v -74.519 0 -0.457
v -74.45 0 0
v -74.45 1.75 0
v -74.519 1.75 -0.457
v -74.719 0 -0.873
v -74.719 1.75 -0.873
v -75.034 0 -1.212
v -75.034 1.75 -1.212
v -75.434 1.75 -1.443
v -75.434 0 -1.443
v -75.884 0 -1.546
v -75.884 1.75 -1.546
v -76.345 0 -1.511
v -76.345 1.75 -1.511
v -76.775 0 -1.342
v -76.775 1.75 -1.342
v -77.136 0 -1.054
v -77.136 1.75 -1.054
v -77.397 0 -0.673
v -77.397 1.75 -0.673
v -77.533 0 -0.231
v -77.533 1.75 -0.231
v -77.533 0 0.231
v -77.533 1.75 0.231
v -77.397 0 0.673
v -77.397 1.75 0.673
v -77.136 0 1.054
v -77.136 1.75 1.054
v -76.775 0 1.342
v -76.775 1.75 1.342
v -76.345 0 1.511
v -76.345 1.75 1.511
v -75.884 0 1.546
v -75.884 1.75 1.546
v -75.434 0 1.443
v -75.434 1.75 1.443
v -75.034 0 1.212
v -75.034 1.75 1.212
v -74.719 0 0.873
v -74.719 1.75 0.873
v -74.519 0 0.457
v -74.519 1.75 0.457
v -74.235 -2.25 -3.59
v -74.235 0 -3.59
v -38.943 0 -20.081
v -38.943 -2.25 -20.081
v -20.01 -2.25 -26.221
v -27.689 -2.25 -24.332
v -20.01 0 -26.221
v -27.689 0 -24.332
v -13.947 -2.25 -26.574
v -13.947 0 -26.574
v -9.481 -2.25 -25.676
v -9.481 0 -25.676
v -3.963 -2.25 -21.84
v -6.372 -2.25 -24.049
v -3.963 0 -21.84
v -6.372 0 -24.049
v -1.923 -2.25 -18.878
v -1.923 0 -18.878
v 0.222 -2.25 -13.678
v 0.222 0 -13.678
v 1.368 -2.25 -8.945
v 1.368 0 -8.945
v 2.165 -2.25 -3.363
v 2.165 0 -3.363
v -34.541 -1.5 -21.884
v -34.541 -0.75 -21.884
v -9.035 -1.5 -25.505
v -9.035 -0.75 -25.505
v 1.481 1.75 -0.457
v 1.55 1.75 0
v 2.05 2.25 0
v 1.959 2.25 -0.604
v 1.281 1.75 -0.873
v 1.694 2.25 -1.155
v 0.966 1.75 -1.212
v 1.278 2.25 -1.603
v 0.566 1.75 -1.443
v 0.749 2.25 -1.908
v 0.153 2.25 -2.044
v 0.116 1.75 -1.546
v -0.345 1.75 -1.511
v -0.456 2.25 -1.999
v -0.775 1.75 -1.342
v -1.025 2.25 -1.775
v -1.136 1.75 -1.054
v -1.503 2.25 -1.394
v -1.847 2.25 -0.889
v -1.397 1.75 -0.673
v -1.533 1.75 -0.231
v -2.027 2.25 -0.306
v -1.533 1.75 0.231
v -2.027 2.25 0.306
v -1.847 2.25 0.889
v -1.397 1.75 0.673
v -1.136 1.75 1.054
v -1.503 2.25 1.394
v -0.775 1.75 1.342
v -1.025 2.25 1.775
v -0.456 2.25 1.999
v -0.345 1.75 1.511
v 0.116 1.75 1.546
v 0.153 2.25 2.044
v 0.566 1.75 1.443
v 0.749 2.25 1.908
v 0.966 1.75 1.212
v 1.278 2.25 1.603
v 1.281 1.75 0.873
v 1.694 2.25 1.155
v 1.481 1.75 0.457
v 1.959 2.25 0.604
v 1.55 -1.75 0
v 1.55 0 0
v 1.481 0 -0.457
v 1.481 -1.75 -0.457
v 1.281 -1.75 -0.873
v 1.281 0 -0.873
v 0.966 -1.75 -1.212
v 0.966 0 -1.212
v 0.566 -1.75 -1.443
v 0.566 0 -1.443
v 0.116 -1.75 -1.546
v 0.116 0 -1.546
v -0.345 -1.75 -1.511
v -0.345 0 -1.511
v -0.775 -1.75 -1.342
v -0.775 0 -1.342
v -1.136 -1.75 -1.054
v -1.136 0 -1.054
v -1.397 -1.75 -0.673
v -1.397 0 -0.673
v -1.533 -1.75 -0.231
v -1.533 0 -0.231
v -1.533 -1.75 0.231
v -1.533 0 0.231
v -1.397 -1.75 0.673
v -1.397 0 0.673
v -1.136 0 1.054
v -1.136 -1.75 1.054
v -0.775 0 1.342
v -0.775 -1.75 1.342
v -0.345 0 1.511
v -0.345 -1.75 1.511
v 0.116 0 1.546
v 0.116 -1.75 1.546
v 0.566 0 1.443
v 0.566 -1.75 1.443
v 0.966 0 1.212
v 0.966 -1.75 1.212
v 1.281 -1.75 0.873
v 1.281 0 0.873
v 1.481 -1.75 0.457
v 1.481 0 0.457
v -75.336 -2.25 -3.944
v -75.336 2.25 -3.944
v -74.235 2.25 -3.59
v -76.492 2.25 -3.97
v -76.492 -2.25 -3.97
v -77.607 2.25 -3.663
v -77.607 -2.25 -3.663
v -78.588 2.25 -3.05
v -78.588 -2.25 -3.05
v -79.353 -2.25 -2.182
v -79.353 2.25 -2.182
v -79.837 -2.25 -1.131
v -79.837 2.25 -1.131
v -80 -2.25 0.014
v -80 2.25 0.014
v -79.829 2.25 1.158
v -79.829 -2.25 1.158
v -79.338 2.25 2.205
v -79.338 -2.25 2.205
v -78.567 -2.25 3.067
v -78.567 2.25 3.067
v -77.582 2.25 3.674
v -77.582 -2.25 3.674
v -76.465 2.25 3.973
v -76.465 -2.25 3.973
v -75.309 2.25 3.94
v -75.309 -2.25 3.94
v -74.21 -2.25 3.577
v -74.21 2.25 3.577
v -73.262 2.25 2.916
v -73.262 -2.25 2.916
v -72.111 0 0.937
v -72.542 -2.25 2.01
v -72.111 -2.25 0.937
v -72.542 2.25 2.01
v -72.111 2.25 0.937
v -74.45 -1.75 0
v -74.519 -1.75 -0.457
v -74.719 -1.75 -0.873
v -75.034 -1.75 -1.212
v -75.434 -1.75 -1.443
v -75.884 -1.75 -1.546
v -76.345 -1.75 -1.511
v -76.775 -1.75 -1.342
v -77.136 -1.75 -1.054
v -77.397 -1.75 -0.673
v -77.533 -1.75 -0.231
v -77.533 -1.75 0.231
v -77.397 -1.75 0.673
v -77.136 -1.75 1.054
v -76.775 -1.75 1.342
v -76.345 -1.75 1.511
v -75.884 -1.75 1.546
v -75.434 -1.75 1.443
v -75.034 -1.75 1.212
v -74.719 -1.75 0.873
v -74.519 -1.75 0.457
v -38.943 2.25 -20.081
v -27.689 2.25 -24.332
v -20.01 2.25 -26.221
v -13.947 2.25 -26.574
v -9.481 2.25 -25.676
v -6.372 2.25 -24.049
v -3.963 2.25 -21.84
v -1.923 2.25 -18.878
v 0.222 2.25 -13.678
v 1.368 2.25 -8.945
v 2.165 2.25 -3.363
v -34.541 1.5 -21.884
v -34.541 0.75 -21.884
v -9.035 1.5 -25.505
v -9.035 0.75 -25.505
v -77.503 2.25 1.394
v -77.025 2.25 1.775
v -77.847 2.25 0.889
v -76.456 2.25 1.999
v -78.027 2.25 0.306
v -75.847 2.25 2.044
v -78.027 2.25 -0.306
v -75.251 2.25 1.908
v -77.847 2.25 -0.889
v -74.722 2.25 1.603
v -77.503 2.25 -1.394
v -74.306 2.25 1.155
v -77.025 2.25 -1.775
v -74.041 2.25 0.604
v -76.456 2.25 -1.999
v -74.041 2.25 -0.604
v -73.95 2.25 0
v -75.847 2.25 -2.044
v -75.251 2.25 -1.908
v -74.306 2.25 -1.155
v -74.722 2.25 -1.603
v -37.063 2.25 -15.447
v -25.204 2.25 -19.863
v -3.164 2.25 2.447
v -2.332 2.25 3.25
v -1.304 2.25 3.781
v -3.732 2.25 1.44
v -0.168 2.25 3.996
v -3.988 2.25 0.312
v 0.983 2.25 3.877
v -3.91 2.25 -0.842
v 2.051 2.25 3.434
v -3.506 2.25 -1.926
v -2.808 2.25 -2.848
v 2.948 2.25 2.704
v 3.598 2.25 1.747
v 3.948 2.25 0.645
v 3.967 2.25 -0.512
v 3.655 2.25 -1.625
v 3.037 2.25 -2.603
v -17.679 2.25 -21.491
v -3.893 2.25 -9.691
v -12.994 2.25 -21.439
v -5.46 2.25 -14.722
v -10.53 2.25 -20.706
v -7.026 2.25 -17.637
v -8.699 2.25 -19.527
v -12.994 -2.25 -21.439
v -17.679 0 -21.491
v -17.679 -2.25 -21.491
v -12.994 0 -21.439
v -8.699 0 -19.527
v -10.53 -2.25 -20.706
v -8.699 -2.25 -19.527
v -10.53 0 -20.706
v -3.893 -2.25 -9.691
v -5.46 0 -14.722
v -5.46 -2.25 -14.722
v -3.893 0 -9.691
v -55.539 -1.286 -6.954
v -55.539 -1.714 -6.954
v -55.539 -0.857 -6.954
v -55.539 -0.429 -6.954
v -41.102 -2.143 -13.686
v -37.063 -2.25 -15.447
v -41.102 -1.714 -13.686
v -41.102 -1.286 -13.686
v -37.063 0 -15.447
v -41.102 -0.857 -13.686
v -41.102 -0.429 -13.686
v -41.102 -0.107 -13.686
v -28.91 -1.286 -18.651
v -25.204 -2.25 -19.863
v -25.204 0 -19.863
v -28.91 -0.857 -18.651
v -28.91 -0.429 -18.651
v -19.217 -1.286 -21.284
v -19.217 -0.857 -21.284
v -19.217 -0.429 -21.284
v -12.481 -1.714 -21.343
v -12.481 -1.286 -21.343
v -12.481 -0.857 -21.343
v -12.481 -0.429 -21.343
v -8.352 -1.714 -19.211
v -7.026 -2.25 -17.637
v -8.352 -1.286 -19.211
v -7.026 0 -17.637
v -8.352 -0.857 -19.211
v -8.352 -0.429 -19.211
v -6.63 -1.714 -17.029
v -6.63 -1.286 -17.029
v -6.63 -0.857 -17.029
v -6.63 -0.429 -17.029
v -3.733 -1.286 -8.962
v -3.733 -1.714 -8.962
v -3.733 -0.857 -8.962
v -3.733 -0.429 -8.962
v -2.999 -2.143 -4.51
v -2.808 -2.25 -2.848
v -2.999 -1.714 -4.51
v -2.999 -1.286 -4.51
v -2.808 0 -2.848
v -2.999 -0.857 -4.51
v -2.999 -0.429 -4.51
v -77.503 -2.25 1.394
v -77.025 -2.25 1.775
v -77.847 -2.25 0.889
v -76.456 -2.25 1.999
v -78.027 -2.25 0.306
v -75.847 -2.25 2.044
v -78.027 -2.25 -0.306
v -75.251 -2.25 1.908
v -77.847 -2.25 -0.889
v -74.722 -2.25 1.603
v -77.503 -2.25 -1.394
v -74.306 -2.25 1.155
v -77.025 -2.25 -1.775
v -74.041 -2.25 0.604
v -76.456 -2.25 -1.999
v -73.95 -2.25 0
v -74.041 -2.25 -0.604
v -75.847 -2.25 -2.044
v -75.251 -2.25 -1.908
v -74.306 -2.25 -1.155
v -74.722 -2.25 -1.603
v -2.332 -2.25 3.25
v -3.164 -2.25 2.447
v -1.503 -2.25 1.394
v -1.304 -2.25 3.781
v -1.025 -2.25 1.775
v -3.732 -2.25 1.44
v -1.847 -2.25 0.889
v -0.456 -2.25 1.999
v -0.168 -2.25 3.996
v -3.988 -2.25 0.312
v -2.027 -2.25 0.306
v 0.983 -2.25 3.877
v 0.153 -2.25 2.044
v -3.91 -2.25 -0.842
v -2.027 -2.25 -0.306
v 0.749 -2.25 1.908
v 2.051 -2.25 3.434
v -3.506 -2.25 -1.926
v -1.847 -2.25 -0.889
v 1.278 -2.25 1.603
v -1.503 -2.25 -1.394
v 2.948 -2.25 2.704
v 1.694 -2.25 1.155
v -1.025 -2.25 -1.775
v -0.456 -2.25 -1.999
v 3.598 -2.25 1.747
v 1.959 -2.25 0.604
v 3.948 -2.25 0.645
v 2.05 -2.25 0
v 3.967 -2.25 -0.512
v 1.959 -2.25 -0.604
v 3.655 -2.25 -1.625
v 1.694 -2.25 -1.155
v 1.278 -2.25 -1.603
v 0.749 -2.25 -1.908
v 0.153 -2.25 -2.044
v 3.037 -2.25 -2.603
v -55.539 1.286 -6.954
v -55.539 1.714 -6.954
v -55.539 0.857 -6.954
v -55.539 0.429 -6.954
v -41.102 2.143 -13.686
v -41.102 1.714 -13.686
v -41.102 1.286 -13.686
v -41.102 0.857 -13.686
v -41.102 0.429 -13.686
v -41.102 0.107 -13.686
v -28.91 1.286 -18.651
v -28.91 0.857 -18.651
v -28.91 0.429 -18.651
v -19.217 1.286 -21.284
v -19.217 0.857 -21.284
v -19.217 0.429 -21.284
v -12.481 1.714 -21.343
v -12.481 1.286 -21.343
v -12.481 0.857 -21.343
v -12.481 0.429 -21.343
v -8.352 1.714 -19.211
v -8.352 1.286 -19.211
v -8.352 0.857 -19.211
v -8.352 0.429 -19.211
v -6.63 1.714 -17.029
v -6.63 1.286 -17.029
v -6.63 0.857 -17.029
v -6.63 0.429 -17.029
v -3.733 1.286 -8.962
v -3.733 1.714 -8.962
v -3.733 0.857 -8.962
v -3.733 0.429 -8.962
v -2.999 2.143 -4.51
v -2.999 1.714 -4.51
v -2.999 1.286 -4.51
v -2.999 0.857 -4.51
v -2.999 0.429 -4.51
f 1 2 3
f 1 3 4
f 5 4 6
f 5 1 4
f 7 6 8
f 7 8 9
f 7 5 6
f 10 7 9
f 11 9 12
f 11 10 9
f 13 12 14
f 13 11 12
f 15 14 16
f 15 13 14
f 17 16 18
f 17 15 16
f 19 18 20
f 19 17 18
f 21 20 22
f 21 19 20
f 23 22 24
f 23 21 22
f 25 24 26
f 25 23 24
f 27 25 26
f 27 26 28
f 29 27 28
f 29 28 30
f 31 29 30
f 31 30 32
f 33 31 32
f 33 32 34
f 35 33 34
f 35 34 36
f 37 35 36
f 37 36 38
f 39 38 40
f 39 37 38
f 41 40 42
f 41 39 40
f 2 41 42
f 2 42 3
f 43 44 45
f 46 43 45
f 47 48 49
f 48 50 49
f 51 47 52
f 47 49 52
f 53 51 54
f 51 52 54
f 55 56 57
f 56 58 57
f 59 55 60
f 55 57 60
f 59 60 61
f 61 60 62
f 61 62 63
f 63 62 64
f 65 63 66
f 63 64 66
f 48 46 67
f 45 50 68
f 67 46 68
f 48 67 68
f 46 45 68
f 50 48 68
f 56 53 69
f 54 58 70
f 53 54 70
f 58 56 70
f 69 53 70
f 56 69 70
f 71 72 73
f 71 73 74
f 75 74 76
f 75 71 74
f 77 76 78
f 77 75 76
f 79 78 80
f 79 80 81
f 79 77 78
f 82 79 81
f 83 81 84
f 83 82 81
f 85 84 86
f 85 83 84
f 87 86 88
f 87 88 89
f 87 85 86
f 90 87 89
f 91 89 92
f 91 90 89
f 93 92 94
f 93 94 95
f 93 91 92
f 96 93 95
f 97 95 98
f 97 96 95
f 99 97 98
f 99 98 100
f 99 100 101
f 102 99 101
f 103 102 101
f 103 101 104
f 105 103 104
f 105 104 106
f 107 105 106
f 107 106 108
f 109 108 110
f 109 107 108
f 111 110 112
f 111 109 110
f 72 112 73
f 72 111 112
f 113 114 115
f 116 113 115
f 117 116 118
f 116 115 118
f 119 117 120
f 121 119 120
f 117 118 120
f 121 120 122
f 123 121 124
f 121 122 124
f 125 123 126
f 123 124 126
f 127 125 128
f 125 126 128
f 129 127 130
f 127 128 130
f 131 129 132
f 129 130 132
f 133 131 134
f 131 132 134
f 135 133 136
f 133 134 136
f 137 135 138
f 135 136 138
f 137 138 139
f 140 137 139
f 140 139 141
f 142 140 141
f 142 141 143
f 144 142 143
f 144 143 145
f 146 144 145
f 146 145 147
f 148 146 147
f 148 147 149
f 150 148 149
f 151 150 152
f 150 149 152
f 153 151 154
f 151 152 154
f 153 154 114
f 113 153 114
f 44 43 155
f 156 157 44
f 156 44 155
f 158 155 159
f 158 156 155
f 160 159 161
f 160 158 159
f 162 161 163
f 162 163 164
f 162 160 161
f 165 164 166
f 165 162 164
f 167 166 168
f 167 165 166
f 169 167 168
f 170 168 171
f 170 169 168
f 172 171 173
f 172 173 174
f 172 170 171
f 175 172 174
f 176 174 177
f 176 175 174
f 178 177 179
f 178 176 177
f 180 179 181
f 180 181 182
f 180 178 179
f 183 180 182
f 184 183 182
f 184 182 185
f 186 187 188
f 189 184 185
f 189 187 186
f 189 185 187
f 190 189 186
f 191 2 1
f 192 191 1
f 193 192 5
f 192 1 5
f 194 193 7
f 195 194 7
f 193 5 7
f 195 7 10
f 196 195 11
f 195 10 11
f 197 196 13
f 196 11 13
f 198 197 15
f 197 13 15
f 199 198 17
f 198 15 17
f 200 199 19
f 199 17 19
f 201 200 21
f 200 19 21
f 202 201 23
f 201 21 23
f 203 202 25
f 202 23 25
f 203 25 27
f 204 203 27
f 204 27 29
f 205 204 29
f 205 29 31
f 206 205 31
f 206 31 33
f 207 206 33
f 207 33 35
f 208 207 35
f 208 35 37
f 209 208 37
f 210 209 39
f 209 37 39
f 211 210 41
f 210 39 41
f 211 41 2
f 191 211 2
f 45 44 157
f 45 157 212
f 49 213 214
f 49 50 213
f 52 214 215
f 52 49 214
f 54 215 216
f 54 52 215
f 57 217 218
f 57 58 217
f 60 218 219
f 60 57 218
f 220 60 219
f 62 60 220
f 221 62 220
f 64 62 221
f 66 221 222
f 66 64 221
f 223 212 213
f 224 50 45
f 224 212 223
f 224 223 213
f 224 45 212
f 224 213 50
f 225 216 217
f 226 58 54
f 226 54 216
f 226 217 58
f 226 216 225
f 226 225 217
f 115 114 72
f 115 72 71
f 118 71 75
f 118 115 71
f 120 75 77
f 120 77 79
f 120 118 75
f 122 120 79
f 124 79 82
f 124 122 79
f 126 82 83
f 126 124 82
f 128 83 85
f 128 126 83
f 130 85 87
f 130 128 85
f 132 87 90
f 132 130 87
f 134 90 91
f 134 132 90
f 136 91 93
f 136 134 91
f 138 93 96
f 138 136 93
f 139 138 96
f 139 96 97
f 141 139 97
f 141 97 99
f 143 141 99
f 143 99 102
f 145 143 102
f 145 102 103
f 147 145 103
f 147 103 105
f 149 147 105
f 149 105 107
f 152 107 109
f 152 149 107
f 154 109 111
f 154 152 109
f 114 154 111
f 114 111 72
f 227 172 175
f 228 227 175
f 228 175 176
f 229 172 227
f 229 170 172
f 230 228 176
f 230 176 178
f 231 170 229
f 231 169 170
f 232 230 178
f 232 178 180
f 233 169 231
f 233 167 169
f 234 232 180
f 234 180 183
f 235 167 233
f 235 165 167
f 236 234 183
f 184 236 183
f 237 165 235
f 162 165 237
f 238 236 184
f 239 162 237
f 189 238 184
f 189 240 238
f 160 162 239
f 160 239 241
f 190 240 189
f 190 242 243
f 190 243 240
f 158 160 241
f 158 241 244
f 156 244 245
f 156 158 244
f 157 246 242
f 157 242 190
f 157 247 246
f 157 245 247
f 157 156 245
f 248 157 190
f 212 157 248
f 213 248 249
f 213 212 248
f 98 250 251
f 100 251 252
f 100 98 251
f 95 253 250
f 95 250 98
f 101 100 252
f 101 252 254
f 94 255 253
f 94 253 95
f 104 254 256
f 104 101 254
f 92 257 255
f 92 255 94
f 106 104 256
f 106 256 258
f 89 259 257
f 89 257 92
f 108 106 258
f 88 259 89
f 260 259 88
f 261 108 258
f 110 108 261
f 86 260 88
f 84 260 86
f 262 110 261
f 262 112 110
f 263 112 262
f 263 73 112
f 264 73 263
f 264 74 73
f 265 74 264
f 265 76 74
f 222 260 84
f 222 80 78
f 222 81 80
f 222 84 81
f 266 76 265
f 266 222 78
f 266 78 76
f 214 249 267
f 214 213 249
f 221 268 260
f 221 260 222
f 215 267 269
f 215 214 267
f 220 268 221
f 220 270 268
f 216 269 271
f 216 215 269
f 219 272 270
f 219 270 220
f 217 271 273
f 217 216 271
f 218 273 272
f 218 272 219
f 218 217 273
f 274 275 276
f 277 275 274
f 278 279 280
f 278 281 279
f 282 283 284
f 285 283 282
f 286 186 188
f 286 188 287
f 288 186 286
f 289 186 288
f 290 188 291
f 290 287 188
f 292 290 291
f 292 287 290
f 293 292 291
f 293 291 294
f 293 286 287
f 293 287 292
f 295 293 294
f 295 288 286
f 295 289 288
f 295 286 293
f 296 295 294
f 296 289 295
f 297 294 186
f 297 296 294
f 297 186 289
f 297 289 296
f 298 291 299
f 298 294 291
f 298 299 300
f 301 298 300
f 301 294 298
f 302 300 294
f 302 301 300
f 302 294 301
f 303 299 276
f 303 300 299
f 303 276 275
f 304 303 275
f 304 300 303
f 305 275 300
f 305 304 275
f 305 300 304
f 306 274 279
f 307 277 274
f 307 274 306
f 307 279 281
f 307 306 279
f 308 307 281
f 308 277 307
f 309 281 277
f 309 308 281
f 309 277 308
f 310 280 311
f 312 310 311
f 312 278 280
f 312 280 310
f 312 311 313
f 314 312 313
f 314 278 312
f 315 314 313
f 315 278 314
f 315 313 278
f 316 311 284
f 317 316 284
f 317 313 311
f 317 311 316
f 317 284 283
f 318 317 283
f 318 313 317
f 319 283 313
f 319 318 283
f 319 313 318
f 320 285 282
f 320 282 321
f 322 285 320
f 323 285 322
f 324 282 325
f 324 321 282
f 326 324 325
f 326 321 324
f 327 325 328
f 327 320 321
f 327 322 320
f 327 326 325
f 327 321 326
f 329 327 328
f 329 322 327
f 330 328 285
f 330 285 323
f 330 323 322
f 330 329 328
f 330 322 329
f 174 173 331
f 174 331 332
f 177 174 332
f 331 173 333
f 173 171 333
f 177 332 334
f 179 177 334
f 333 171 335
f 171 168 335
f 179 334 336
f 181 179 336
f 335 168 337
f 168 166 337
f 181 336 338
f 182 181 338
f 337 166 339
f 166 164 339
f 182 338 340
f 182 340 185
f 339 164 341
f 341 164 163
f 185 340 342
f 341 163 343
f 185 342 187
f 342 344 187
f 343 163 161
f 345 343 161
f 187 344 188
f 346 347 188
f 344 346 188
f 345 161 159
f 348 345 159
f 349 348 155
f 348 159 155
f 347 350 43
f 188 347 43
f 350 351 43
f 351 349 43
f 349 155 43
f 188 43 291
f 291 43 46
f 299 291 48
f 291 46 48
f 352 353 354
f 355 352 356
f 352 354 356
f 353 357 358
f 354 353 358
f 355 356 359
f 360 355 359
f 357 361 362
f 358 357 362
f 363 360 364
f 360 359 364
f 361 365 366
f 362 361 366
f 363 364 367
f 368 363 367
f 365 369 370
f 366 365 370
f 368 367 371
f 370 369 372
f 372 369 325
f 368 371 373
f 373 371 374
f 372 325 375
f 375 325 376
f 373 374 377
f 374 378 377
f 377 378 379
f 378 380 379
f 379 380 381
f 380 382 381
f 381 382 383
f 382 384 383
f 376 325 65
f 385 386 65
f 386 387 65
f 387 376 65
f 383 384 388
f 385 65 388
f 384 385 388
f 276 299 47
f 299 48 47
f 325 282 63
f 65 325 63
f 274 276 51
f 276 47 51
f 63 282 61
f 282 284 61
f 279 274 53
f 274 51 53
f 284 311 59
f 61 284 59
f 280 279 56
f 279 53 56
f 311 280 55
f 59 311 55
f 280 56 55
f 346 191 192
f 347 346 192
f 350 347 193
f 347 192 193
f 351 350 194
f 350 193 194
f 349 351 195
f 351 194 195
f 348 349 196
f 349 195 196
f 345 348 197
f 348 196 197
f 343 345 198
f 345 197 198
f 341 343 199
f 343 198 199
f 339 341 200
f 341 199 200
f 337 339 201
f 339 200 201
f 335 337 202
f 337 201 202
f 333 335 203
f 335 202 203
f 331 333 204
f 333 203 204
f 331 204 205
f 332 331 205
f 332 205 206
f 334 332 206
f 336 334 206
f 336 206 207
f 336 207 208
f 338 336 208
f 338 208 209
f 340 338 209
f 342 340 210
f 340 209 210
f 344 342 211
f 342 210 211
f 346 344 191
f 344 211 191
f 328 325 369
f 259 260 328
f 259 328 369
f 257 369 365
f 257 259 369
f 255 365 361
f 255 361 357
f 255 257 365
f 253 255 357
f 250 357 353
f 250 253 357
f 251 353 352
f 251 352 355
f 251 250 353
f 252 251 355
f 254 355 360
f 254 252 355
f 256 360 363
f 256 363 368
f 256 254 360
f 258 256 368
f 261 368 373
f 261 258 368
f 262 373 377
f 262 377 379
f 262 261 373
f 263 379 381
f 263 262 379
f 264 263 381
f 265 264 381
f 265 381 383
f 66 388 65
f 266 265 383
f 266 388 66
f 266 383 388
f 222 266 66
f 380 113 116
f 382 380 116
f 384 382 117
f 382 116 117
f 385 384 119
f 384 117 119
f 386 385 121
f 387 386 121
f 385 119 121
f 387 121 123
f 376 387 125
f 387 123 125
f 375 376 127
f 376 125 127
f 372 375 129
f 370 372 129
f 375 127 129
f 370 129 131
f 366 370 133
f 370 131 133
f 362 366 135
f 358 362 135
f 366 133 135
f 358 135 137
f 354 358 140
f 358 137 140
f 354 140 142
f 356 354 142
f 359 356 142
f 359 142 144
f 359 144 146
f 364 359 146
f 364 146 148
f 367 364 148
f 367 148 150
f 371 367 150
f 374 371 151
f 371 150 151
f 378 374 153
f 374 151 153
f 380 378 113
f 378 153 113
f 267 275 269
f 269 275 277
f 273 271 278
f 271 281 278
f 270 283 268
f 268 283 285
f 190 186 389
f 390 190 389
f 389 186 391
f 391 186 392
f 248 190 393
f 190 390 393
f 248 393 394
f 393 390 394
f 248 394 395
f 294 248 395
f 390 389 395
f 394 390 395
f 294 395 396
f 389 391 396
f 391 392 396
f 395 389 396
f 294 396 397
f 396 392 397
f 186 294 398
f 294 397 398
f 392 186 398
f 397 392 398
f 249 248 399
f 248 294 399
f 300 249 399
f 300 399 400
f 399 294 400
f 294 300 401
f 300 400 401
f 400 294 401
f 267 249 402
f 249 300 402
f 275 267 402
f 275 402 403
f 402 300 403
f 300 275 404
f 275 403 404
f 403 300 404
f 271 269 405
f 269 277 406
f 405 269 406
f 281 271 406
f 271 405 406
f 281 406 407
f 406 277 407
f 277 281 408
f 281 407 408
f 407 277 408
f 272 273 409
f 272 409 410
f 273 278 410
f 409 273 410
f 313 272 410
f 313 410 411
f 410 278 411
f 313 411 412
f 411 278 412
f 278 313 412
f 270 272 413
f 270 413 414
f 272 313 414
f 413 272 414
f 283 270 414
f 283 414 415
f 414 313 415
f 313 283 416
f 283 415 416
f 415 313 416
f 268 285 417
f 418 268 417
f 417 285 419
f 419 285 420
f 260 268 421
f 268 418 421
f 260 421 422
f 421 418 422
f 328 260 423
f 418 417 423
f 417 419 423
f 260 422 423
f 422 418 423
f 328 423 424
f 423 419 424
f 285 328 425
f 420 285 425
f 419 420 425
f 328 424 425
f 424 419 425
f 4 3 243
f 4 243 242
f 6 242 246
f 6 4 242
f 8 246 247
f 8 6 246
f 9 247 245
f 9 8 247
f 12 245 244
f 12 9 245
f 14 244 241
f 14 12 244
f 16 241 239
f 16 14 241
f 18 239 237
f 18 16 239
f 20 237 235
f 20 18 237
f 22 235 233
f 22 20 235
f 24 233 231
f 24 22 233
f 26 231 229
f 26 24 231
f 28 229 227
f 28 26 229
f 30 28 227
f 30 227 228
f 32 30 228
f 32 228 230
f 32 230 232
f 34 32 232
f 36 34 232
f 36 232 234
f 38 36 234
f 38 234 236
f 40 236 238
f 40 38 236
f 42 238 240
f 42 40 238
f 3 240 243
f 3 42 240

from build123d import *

# Parameters (mm, degrees)
SKETCH3_R           = 1.55
BOSS_EXTRUDE1_DEPTH = 2.25
CHAMFER1_SIZE       = 0.5


with BuildPart() as part:
    # Sketch3 → Boss-Extrude1 (new body, symmetric)
    with BuildSketch(Plane(origin=(0, 0, 0), x_dir=(1, 0, 0), z_dir=(0, 1, 0))):
        with BuildLine():
            ThreePointArc((-2.80821547, 2.84849537), (0.411852892, -3.978740654), (2.165210348, 3.363311485))
            add(Edge.make_bspline(
                [(-74.235072149, 3.589572353), (-27.485482272, 25.523814126), (-1.842755976, 42.082618466), (2.165210348, 3.363311485)],
                knots=[0, 0, 0, 0, 1, 1, 1, 1], degree=3))
            ThreePointArc((-74.235072149, 3.589572353), (-79.621229083, -1.699029113), (-72.111285757, -0.936964001))
            add(Edge.make_bspline(
                [(-72.111285757, -0.936964001), (-71.382108659, -0.594844491), (-69.917251853, 0.094667481), (-67.049234703, 1.45209838), (-63.539724816, 3.124374093), (-59.462435041, 5.076470765), (-54.201449811, 7.59587191), (-47.958388467, 10.563969303), (-41.009247812, 13.759956724), (-34.617613527, 16.513148974), (-26.871463459, 19.496190833), (-20.351407752, 21.288761702), (-15.316977929, 21.723706174), (-12.356142276, 21.425163203), (-10.144784364, 20.631187861), (-8.338210468, 19.350526304), (-6.611394971, 17.231248815), (-5.267852087, 14.452861921), (-4.332671494, 11.546431493), (-3.717026418, 9.021473164), (-3.285270796, 6.617744988), (-2.994980954, 4.531394989), (-2.865617891, 3.403036451), (-2.80821547, 2.84849537)],
                knots=[0, 0, 0, 0, 0.015625, 0.03125, 0.0625, 0.09375, 0.125, 0.1875, 0.25, 0.3125, 0.375, 0.5, 0.5625, 0.625, 0.6875, 0.75, 0.8125, 0.875, 0.90625, 0.9375, 0.96875, 0.984375, 1, 1, 1, 1], degree=3))
        make_face()
        with Locations((-76, 0)):
            Circle(SKETCH3_R, mode=Mode.SUBTRACT)
        Circle(SKETCH3_R, mode=Mode.SUBTRACT)
    extrude(amount=BOSS_EXTRUDE1_DEPTH, both=True)

    # Chamfer1
    chamfer1_edges = [part.edges().sort_by_distance(p)[0] for p in [
        (-77.55, -2.25, 0),
        (-1.55, -2.25, 0),
        (-77.55, 2.25, 0),
        (-1.55, 2.25, 0),
    ]]
    chamfer(chamfer1_edges, length=CHAMFER1_SIZE)


solid = part.part
